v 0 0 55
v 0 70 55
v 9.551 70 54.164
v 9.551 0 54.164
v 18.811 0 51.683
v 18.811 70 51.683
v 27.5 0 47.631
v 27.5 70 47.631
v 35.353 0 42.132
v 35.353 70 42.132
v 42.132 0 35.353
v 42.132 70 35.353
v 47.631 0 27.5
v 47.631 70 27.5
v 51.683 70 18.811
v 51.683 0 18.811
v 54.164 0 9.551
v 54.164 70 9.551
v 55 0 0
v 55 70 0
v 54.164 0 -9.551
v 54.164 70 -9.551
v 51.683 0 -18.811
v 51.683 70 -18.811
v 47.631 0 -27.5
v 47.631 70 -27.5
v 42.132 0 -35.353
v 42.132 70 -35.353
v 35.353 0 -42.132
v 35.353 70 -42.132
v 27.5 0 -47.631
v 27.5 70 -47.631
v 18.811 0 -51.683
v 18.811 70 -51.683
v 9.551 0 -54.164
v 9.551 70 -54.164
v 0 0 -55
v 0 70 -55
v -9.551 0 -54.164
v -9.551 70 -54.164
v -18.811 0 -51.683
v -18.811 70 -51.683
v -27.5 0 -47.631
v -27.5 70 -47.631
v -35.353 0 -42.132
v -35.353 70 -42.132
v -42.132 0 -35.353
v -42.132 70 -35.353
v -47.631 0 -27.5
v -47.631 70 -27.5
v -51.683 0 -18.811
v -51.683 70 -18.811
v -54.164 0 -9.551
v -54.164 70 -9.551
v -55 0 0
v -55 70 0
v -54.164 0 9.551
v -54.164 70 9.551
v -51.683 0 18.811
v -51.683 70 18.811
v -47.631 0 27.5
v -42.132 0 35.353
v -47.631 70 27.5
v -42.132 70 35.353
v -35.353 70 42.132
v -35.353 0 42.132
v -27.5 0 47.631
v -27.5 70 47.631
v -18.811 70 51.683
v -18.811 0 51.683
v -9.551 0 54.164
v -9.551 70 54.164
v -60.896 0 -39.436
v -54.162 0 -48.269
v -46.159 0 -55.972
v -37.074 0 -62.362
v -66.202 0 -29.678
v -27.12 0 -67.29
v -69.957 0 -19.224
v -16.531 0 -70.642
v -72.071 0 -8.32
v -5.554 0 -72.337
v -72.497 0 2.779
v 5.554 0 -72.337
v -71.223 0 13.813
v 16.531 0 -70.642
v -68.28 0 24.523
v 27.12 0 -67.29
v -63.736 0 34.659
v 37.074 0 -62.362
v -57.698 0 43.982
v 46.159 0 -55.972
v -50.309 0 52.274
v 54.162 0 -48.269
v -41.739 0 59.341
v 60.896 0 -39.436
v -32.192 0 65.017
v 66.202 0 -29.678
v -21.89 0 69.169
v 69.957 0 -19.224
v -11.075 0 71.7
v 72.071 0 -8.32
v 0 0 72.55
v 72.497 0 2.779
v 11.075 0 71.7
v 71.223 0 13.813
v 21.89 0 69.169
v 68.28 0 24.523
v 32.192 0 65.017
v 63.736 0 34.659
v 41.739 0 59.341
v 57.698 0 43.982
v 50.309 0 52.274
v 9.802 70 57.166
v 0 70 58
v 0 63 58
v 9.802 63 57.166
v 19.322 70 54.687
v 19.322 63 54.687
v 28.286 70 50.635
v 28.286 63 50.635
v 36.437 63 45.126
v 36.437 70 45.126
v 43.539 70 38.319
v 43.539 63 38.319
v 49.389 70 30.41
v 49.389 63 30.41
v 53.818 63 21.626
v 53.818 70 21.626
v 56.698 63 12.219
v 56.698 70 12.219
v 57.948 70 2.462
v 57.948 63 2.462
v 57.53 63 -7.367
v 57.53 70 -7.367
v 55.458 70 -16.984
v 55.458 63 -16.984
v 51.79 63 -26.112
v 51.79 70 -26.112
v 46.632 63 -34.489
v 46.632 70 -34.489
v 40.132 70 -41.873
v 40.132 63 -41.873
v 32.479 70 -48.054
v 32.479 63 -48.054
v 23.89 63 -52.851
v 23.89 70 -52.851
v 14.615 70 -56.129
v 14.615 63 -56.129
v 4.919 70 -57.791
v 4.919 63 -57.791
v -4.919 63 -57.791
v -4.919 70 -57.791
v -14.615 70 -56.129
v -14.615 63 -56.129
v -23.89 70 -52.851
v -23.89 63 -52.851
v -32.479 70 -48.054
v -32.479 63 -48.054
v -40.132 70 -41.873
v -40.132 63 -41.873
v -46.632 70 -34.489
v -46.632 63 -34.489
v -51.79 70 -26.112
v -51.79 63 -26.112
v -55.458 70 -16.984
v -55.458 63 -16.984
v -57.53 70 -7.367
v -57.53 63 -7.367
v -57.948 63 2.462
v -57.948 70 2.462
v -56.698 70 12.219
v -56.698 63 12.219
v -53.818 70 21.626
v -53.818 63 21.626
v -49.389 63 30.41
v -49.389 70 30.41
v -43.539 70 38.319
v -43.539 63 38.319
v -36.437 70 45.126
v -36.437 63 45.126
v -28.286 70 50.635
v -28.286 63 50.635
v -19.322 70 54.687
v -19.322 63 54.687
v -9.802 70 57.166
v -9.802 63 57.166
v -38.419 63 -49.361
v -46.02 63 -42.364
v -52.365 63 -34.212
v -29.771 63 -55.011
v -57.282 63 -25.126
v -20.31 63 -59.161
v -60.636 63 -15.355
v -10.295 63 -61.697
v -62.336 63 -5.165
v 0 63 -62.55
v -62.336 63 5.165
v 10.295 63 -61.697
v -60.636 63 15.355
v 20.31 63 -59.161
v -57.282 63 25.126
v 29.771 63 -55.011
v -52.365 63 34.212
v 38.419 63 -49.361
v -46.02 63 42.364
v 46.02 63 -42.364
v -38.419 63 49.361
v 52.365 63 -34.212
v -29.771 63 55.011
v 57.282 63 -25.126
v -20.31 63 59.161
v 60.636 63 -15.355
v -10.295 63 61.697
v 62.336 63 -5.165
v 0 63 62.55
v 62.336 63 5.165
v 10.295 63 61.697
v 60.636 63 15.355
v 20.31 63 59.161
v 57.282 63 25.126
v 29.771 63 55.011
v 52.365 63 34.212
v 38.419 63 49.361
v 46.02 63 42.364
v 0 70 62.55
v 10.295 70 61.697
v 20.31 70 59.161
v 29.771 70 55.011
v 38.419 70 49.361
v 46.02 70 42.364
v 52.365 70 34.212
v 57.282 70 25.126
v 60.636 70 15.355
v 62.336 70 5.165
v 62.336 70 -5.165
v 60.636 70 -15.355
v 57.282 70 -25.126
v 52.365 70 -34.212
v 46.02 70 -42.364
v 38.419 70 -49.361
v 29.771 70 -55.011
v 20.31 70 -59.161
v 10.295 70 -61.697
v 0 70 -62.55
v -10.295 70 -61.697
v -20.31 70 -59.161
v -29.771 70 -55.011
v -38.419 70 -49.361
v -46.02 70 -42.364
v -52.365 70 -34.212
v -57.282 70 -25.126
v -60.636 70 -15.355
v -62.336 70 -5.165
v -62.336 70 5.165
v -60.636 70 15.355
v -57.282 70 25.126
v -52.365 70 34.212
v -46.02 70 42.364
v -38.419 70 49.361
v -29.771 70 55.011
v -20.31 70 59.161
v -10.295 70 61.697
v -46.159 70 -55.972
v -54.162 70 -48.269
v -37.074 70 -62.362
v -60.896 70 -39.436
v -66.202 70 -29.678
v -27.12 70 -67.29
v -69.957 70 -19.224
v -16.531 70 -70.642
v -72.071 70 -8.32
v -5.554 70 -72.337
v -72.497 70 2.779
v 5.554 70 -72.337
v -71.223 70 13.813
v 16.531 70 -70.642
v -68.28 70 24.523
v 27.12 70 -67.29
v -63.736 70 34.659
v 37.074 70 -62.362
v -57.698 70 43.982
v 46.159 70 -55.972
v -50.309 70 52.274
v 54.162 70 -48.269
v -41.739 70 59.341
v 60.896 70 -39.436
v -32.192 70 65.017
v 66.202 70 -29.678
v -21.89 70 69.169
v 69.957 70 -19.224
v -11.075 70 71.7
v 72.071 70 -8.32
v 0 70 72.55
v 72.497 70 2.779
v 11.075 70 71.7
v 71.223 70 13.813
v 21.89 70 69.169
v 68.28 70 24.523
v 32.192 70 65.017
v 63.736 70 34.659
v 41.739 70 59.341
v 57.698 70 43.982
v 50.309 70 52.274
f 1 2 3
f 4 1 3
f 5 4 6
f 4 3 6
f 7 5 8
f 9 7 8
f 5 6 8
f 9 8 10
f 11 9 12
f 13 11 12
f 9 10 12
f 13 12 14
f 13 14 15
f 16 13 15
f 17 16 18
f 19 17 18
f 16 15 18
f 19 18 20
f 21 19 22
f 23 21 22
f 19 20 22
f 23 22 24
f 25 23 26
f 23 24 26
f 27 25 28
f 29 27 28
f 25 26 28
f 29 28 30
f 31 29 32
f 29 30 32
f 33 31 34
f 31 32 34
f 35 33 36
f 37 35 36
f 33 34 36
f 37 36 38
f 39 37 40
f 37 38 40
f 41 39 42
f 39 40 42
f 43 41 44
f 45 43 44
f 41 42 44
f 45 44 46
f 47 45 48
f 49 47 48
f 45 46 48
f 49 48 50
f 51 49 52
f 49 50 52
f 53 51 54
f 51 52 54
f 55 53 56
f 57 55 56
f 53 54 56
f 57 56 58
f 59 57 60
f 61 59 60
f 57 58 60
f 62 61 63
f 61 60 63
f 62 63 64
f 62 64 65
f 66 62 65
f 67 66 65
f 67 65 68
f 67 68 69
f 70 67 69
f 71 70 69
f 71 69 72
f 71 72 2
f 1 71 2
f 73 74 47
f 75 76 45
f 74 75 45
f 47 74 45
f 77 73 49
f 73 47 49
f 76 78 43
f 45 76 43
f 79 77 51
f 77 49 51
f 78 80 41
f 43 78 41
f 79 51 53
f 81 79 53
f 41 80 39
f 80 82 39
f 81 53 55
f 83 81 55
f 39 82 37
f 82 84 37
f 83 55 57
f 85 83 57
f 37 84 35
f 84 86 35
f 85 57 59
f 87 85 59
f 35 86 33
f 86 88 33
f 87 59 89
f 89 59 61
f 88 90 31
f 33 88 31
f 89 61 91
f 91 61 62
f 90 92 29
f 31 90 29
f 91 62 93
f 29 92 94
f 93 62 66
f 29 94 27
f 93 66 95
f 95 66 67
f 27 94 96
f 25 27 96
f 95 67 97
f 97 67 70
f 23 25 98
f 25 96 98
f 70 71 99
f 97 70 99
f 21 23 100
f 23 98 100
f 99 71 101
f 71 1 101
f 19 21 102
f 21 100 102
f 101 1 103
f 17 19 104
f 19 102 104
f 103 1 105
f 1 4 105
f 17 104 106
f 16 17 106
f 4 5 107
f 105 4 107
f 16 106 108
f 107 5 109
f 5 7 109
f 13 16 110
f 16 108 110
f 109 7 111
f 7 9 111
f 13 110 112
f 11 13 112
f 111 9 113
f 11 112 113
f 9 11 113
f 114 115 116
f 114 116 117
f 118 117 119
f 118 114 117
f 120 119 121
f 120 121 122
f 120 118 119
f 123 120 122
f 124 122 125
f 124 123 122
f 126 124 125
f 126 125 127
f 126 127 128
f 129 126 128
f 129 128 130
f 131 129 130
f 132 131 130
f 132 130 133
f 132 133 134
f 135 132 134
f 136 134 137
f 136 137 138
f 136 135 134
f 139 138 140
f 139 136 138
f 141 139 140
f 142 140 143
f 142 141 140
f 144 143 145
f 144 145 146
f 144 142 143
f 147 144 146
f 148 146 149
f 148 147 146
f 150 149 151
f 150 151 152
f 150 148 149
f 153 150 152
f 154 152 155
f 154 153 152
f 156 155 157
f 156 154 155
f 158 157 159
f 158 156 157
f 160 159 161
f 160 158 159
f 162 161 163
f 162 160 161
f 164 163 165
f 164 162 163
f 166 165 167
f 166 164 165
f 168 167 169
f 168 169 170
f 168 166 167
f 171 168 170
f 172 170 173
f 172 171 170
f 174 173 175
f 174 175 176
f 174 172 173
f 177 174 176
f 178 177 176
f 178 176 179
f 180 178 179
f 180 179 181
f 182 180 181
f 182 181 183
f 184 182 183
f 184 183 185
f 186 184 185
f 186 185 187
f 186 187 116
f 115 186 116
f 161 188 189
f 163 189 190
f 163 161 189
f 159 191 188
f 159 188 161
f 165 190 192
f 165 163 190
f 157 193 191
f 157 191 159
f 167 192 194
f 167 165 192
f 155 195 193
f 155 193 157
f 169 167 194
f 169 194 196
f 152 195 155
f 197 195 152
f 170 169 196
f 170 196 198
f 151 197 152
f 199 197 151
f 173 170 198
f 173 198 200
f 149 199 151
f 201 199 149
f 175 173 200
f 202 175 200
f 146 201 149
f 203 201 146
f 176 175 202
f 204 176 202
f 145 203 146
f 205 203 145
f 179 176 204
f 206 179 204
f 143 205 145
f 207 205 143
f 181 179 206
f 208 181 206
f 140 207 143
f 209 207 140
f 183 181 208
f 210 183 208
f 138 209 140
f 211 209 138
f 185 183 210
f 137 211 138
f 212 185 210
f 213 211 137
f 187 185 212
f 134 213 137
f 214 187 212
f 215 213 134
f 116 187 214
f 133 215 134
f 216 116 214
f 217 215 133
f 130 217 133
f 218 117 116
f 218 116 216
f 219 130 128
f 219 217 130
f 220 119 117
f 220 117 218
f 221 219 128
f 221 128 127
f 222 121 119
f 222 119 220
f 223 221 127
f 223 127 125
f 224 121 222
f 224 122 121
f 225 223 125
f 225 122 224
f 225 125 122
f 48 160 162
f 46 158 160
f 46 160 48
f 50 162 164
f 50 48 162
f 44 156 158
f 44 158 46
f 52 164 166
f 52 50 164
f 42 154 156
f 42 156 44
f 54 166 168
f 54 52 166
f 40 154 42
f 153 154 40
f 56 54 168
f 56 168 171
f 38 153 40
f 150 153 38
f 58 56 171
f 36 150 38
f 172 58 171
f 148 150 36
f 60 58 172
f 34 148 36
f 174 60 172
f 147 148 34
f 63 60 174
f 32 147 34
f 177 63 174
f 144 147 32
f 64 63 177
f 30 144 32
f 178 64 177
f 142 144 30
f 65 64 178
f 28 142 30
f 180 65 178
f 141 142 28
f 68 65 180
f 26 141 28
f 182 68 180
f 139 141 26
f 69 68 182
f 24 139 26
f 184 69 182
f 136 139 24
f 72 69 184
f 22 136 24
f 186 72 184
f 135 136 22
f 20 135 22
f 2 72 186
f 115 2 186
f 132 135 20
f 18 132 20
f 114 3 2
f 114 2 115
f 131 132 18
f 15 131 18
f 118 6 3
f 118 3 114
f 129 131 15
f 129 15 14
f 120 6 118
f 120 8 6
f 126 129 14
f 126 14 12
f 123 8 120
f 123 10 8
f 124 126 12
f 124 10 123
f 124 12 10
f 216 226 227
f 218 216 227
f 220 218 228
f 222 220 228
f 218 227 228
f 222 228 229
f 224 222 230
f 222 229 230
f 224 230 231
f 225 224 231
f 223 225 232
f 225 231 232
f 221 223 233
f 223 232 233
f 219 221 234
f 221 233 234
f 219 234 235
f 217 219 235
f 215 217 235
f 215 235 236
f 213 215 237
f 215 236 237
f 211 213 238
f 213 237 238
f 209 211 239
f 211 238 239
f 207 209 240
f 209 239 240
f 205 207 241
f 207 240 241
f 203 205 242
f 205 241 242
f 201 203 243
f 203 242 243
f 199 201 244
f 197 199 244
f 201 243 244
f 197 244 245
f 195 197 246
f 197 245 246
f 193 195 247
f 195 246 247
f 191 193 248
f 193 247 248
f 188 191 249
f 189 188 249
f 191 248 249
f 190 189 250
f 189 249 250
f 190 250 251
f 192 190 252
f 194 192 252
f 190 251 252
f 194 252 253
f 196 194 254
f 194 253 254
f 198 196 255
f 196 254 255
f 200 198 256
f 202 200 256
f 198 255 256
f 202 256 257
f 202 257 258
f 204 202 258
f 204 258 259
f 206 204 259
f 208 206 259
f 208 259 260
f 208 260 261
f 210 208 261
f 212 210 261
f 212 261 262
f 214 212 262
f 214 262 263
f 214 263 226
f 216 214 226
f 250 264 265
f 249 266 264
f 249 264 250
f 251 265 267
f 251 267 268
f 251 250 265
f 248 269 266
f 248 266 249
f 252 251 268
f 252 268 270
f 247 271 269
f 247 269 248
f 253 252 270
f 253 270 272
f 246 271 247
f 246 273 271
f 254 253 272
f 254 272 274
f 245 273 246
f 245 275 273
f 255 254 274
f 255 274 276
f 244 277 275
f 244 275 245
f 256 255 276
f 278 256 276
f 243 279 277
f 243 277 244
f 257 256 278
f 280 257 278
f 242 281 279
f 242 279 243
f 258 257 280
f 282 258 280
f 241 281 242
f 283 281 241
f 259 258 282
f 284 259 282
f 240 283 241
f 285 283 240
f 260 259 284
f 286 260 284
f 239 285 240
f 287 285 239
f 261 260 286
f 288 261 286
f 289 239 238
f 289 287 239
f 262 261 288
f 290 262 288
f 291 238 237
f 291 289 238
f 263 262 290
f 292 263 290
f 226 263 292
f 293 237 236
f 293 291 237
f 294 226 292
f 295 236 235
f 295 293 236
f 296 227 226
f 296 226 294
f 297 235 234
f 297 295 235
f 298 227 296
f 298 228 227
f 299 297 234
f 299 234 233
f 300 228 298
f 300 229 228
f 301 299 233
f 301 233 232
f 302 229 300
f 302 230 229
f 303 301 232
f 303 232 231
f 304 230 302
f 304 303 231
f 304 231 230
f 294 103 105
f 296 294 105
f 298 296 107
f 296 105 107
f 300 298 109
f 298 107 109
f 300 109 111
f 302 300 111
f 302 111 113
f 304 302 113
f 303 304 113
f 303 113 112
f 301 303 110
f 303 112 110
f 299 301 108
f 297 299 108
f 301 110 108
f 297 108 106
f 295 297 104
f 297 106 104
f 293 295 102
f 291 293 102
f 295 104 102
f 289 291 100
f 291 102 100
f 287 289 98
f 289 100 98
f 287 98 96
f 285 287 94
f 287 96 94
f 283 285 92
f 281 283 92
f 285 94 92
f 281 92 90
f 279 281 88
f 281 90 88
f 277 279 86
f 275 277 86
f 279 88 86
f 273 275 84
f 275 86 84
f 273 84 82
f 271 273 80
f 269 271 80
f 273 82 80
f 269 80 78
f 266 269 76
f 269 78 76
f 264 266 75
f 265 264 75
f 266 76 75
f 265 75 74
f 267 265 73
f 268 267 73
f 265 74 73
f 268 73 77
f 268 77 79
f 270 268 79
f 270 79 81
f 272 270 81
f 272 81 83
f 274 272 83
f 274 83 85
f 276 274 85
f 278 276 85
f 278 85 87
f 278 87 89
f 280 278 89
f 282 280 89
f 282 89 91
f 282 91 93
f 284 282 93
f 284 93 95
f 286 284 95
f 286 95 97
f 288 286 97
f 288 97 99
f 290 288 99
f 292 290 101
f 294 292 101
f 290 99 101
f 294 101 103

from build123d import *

# Parameters (mm, degrees)
SKETCH_4_R            = 72.55
EXTRUDE_297_DEPTH     = 70
SKETCH_8_R            = 62.55
SKETCH_8_R_2          = 58
CUT_EXTRUDE_406_DEPTH = 7
SKETCH_9_R            = 55
CUT_EXTRUDE_3_DEPTH   = 70


with BuildPart() as part:
    # 草圖4 → Extrude 297 (new body)
    with BuildSketch(Plane(origin=(0, 0, 0), x_dir=(1, 0, 0), z_dir=(0, 1, 0))):
        with Locations(Location((0, 0, 0), (0, 0, 270))):
            Circle(SKETCH_4_R)
    extrude(amount=EXTRUDE_297_DEPTH)

    # 草圖8 → Cut-Extrude 406 (cut)
    with BuildSketch(Plane(origin=(0, 70, 0), x_dir=(1, 0, 0), z_dir=(0, 1, 0))):
        with Locations(Location((0, 0, 0), (0, 0, 270))):
            Circle(SKETCH_8_R)
        with Locations(Location((0, 0, 0), (0, 0, 270))):
            Circle(SKETCH_8_R_2, mode=Mode.SUBTRACT)
    extrude(amount=-CUT_EXTRUDE_406_DEPTH, mode=Mode.SUBTRACT)

    # 草圖9 → 除料-伸長3 (cut)
    with BuildSketch(Plane(origin=(0, 70, 0), x_dir=(1, 0, 0), z_dir=(0, 1, 0))):
        with Locations(Location((0, 0, 0), (0, 0, 270))):
            Circle(SKETCH_9_R)
    extrude(amount=-CUT_EXTRUDE_3_DEPTH, mode=Mode.SUBTRACT)


solid = part.part
